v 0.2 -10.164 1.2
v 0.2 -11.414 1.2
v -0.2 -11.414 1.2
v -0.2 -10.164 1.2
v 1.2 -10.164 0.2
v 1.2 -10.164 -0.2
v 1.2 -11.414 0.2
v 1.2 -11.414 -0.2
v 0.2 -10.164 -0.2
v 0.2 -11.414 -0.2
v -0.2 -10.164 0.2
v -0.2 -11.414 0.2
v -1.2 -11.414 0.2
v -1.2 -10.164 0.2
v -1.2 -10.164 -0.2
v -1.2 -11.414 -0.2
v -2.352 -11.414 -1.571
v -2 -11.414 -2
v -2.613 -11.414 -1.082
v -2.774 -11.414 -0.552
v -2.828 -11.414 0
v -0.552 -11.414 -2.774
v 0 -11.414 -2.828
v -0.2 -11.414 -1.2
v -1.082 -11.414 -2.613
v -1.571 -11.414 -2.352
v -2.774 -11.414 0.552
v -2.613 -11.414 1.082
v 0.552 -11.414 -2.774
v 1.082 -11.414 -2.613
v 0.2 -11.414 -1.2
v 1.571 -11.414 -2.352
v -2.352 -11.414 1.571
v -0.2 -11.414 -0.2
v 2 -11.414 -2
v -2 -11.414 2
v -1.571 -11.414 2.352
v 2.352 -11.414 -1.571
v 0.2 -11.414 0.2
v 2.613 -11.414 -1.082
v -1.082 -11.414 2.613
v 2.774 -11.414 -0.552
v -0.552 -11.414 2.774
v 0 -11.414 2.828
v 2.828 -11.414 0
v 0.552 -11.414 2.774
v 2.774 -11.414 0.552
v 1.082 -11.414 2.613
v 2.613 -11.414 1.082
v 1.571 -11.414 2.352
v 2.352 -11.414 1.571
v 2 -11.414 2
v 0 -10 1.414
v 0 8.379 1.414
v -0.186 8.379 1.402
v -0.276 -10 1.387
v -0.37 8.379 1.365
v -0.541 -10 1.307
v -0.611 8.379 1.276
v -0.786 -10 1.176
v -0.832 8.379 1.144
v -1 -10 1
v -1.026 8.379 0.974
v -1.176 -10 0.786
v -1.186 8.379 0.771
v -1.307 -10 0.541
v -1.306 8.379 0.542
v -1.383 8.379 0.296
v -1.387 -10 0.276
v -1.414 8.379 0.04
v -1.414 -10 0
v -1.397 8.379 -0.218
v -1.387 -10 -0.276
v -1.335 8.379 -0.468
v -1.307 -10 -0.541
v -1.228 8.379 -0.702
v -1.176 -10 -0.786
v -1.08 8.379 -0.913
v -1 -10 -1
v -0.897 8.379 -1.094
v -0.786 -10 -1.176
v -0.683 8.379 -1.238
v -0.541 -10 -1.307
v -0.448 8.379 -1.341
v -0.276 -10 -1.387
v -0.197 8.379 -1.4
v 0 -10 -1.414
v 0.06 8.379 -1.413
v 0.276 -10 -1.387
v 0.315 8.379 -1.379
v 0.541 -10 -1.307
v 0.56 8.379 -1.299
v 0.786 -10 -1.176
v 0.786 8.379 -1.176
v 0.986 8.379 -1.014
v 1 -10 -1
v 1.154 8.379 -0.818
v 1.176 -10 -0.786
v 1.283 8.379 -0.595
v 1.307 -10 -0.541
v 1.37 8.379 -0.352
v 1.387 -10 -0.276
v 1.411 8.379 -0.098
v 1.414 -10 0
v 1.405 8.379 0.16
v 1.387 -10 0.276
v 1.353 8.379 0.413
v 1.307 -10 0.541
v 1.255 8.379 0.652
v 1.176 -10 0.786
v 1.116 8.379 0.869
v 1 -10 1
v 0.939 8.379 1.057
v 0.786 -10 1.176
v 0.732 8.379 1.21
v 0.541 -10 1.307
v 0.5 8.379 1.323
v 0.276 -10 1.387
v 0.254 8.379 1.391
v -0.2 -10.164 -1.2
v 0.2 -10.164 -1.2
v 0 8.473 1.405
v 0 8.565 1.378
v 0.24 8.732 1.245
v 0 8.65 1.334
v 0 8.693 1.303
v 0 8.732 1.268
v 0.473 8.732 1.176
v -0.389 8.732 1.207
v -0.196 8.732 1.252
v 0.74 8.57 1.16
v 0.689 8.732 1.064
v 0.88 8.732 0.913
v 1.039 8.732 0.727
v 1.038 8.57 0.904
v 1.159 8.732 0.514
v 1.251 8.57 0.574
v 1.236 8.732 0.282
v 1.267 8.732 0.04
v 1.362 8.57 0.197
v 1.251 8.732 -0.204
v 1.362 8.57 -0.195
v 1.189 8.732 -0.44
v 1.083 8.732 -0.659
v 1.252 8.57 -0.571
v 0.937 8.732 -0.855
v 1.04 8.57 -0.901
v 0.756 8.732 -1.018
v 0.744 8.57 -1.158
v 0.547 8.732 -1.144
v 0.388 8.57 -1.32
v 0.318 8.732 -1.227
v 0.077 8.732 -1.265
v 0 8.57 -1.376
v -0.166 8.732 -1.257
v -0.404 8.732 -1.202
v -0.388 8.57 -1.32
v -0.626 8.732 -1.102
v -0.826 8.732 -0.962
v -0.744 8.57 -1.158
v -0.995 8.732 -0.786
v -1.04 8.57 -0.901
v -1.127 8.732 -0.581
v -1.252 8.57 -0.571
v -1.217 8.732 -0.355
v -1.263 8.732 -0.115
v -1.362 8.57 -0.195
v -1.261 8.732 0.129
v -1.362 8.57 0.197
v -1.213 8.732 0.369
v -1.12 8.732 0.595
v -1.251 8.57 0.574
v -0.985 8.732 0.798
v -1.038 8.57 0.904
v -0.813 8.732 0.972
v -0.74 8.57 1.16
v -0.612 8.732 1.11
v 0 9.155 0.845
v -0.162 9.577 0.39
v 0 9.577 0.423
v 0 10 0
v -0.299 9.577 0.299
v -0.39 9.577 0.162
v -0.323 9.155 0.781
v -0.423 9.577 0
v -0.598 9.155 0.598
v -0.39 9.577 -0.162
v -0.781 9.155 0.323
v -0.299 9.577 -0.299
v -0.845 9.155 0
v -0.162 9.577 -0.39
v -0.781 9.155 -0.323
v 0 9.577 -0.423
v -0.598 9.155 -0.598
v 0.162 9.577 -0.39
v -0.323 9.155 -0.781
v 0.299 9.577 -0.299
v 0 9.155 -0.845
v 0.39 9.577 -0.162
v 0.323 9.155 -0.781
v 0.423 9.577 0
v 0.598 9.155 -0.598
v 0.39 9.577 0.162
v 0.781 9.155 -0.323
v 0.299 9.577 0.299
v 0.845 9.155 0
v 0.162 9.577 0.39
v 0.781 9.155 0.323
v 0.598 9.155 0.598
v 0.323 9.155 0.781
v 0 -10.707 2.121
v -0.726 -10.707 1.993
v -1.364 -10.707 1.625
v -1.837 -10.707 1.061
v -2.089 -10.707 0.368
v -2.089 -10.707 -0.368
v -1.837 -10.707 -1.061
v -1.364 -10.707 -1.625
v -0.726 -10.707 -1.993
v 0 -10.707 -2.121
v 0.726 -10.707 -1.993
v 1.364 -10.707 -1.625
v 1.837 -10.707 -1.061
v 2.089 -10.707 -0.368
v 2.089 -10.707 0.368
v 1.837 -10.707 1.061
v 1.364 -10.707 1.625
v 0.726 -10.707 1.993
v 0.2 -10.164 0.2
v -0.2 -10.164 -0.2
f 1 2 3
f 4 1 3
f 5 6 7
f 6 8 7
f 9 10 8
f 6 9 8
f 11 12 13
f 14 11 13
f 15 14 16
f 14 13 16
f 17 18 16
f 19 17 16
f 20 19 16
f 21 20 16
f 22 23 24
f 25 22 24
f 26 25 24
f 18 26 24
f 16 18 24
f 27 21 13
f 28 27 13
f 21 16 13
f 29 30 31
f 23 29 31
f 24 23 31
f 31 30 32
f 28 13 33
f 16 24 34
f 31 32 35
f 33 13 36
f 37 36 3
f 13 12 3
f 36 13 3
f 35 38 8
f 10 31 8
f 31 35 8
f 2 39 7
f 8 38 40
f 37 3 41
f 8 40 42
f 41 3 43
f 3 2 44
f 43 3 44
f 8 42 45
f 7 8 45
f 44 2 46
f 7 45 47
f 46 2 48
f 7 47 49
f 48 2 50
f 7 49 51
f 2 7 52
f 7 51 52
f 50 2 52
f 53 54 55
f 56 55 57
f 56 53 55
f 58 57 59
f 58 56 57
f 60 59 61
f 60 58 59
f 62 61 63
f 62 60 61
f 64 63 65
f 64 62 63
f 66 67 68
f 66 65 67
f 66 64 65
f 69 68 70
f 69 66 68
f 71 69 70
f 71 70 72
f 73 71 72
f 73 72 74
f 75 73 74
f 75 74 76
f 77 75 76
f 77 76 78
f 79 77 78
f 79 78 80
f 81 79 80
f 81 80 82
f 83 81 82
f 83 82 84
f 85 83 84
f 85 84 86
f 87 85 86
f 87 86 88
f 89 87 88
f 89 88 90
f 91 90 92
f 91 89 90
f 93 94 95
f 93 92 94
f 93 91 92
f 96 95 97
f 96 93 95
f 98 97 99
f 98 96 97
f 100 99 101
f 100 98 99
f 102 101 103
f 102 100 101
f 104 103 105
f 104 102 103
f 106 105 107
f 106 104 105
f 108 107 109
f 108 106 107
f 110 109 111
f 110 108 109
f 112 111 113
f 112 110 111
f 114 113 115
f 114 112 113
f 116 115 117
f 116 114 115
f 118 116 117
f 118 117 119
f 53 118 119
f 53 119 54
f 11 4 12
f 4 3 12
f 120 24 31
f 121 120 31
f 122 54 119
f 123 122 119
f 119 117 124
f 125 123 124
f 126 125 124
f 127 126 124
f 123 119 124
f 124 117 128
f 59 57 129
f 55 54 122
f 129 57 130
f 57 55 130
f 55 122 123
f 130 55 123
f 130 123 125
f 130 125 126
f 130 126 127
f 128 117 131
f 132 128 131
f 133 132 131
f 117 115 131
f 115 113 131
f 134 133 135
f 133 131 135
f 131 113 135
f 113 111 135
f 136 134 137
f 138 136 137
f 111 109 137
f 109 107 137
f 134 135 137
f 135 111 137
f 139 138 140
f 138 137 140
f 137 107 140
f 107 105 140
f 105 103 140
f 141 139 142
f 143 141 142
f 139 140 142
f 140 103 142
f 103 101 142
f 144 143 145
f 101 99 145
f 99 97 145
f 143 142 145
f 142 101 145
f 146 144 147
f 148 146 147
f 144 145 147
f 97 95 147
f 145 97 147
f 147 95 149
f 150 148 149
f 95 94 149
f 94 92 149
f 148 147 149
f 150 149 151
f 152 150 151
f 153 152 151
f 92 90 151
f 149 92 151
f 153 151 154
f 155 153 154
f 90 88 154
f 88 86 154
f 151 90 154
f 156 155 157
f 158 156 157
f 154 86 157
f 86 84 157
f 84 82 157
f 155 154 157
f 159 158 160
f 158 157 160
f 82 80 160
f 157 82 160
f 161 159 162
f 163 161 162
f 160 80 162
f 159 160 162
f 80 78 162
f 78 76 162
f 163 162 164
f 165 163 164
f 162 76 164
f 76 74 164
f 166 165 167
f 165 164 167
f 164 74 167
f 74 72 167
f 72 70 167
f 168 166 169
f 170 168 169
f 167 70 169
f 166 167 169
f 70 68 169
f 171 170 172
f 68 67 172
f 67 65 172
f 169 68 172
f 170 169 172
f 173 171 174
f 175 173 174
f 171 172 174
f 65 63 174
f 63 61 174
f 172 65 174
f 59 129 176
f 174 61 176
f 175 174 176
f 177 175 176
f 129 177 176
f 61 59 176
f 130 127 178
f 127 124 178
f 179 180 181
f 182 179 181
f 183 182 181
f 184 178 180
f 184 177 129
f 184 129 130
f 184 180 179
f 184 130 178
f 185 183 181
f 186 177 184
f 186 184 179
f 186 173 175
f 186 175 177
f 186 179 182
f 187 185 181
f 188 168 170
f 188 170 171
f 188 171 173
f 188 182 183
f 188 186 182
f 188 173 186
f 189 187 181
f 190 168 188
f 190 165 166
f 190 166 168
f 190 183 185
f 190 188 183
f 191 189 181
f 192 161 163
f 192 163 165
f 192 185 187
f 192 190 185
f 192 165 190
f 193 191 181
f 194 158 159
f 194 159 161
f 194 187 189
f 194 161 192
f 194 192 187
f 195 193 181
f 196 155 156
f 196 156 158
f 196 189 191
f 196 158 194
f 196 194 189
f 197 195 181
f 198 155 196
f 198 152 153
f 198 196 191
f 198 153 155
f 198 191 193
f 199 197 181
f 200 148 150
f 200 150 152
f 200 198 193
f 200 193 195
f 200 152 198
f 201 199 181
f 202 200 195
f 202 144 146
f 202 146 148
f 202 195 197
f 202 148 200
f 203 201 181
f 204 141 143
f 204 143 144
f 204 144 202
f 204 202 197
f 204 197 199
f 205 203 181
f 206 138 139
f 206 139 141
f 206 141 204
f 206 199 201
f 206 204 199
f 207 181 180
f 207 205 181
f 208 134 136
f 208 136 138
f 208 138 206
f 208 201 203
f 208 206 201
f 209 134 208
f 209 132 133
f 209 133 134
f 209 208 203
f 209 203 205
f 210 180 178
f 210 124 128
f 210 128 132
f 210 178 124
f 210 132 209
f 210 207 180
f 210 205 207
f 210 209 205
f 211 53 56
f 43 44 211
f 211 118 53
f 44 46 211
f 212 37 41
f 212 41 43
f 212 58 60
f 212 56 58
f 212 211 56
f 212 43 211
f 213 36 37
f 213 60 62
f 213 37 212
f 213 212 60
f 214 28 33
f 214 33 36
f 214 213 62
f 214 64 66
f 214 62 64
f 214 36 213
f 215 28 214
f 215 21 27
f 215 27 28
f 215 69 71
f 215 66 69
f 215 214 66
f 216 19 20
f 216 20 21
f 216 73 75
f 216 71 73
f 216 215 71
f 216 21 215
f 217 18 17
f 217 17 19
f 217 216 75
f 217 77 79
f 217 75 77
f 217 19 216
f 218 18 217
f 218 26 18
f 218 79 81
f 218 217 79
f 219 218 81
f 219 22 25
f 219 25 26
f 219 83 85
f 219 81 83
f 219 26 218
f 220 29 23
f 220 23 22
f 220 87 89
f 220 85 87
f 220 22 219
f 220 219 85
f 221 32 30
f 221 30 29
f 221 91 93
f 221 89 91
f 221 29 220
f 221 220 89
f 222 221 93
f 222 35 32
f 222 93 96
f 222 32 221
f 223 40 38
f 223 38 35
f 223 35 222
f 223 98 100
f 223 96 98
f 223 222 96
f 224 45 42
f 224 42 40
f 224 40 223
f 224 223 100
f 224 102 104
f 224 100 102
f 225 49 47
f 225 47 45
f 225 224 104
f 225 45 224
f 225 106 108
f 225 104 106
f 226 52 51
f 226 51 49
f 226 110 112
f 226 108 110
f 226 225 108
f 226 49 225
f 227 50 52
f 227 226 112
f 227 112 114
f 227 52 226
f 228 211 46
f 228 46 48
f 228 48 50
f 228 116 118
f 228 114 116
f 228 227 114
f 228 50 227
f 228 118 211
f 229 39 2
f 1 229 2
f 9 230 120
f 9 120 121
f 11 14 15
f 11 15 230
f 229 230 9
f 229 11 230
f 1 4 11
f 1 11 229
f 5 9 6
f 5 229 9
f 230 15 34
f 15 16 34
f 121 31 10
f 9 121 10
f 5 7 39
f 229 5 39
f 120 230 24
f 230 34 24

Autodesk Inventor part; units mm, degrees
ref_plane "YZ Plane" through (0, 0, 0) normal (1, 0, 0) x (0, 1, 0)
ref_plane "XZ Plane" through (0, 0, 0) normal (0, 1, 0) x (-1, 0, 0)
ref_plane "XY Plane" through (0, 0, 0) normal (0, 0, 1) x (1, 0, 0)
sketch "Sketch1" plane through (0, 0, 0) normal (1, 0, 0) x (0, 1, 0)
  line L0 (0, 0) -> (10, 0)
  line L1 (0, 0) -> (-10, 0)
  line L2 (10, 0) -> (8.5858, 1.4142)
  line L3 (8.5858, 1.4142) -> (-10, 1.4142)
  line L4 (-10, 1.4142) -> (-10, 0)
  line L5 (-10, 1.4142) -> (-11.453, 1.4142) construction
  line L6 (-10, 1.4142) -> (-11.4142, 2.8284)
  line L7 (-10, 0) -> (-12.8284, 0)
  line L8 (-11.4142, 2.8284) -> (-11.4142, 0)
  dimension "d0" = 10
  dimension "d1" = 10
  dimension "d2" = 2
  dimension "d3" = 45
  dimension "d4" = 2
  dimension "d8" = 45
revolve "Revolution1" add sketch "Sketch1" angle 360 about axis through (0, 0, 0) along (0, 1, 0)
fillet "Fillet1" radius 0.5 1 edges at (0, 8.5858, -1.4142)
sketch "Sketch3" plane through (0, -11.4142, 0) normal (0, -1, 0) x (1, 0, 0)
  line L0 (0.2, 1.2) -> (-0.2, 1.2)
  line L1 (-0.2, 1.2) -> (-0.2, -1.2)
  line L2 (-0.2, -1.2) -> (0.2, -1.2)
  line L3 (0.2, -1.2) -> (0.2, 1.2)
  line L4 (1.2, 0.2) -> (-1.2, 0.2)
  line L5 (-1.2, 0.2) -> (-1.2, -0.2)
  line L6 (-1.2, -0.2) -> (1.2, -0.2)
  line L7 (1.2, -0.2) -> (1.2, 0.2)
  point P0 (0, 0)
  dimension "d28" = 0.2
  dimension "d29" = 0.2
  dimension "d30" = 1.2
  dimension "d31" = 1.2
  dimension "d32" = 1.2
  dimension "d33" = 1.2
  dimension "d34" = 0.2
  dimension "d35" = 0.2
extrude "Extrusion1" cut sketch "Sketch3" against normal blind 1.25
thread "Thread2" size "M3x0.5" class "4g6g" standard "ISO Metric profile" full length
properties part number "screw"
